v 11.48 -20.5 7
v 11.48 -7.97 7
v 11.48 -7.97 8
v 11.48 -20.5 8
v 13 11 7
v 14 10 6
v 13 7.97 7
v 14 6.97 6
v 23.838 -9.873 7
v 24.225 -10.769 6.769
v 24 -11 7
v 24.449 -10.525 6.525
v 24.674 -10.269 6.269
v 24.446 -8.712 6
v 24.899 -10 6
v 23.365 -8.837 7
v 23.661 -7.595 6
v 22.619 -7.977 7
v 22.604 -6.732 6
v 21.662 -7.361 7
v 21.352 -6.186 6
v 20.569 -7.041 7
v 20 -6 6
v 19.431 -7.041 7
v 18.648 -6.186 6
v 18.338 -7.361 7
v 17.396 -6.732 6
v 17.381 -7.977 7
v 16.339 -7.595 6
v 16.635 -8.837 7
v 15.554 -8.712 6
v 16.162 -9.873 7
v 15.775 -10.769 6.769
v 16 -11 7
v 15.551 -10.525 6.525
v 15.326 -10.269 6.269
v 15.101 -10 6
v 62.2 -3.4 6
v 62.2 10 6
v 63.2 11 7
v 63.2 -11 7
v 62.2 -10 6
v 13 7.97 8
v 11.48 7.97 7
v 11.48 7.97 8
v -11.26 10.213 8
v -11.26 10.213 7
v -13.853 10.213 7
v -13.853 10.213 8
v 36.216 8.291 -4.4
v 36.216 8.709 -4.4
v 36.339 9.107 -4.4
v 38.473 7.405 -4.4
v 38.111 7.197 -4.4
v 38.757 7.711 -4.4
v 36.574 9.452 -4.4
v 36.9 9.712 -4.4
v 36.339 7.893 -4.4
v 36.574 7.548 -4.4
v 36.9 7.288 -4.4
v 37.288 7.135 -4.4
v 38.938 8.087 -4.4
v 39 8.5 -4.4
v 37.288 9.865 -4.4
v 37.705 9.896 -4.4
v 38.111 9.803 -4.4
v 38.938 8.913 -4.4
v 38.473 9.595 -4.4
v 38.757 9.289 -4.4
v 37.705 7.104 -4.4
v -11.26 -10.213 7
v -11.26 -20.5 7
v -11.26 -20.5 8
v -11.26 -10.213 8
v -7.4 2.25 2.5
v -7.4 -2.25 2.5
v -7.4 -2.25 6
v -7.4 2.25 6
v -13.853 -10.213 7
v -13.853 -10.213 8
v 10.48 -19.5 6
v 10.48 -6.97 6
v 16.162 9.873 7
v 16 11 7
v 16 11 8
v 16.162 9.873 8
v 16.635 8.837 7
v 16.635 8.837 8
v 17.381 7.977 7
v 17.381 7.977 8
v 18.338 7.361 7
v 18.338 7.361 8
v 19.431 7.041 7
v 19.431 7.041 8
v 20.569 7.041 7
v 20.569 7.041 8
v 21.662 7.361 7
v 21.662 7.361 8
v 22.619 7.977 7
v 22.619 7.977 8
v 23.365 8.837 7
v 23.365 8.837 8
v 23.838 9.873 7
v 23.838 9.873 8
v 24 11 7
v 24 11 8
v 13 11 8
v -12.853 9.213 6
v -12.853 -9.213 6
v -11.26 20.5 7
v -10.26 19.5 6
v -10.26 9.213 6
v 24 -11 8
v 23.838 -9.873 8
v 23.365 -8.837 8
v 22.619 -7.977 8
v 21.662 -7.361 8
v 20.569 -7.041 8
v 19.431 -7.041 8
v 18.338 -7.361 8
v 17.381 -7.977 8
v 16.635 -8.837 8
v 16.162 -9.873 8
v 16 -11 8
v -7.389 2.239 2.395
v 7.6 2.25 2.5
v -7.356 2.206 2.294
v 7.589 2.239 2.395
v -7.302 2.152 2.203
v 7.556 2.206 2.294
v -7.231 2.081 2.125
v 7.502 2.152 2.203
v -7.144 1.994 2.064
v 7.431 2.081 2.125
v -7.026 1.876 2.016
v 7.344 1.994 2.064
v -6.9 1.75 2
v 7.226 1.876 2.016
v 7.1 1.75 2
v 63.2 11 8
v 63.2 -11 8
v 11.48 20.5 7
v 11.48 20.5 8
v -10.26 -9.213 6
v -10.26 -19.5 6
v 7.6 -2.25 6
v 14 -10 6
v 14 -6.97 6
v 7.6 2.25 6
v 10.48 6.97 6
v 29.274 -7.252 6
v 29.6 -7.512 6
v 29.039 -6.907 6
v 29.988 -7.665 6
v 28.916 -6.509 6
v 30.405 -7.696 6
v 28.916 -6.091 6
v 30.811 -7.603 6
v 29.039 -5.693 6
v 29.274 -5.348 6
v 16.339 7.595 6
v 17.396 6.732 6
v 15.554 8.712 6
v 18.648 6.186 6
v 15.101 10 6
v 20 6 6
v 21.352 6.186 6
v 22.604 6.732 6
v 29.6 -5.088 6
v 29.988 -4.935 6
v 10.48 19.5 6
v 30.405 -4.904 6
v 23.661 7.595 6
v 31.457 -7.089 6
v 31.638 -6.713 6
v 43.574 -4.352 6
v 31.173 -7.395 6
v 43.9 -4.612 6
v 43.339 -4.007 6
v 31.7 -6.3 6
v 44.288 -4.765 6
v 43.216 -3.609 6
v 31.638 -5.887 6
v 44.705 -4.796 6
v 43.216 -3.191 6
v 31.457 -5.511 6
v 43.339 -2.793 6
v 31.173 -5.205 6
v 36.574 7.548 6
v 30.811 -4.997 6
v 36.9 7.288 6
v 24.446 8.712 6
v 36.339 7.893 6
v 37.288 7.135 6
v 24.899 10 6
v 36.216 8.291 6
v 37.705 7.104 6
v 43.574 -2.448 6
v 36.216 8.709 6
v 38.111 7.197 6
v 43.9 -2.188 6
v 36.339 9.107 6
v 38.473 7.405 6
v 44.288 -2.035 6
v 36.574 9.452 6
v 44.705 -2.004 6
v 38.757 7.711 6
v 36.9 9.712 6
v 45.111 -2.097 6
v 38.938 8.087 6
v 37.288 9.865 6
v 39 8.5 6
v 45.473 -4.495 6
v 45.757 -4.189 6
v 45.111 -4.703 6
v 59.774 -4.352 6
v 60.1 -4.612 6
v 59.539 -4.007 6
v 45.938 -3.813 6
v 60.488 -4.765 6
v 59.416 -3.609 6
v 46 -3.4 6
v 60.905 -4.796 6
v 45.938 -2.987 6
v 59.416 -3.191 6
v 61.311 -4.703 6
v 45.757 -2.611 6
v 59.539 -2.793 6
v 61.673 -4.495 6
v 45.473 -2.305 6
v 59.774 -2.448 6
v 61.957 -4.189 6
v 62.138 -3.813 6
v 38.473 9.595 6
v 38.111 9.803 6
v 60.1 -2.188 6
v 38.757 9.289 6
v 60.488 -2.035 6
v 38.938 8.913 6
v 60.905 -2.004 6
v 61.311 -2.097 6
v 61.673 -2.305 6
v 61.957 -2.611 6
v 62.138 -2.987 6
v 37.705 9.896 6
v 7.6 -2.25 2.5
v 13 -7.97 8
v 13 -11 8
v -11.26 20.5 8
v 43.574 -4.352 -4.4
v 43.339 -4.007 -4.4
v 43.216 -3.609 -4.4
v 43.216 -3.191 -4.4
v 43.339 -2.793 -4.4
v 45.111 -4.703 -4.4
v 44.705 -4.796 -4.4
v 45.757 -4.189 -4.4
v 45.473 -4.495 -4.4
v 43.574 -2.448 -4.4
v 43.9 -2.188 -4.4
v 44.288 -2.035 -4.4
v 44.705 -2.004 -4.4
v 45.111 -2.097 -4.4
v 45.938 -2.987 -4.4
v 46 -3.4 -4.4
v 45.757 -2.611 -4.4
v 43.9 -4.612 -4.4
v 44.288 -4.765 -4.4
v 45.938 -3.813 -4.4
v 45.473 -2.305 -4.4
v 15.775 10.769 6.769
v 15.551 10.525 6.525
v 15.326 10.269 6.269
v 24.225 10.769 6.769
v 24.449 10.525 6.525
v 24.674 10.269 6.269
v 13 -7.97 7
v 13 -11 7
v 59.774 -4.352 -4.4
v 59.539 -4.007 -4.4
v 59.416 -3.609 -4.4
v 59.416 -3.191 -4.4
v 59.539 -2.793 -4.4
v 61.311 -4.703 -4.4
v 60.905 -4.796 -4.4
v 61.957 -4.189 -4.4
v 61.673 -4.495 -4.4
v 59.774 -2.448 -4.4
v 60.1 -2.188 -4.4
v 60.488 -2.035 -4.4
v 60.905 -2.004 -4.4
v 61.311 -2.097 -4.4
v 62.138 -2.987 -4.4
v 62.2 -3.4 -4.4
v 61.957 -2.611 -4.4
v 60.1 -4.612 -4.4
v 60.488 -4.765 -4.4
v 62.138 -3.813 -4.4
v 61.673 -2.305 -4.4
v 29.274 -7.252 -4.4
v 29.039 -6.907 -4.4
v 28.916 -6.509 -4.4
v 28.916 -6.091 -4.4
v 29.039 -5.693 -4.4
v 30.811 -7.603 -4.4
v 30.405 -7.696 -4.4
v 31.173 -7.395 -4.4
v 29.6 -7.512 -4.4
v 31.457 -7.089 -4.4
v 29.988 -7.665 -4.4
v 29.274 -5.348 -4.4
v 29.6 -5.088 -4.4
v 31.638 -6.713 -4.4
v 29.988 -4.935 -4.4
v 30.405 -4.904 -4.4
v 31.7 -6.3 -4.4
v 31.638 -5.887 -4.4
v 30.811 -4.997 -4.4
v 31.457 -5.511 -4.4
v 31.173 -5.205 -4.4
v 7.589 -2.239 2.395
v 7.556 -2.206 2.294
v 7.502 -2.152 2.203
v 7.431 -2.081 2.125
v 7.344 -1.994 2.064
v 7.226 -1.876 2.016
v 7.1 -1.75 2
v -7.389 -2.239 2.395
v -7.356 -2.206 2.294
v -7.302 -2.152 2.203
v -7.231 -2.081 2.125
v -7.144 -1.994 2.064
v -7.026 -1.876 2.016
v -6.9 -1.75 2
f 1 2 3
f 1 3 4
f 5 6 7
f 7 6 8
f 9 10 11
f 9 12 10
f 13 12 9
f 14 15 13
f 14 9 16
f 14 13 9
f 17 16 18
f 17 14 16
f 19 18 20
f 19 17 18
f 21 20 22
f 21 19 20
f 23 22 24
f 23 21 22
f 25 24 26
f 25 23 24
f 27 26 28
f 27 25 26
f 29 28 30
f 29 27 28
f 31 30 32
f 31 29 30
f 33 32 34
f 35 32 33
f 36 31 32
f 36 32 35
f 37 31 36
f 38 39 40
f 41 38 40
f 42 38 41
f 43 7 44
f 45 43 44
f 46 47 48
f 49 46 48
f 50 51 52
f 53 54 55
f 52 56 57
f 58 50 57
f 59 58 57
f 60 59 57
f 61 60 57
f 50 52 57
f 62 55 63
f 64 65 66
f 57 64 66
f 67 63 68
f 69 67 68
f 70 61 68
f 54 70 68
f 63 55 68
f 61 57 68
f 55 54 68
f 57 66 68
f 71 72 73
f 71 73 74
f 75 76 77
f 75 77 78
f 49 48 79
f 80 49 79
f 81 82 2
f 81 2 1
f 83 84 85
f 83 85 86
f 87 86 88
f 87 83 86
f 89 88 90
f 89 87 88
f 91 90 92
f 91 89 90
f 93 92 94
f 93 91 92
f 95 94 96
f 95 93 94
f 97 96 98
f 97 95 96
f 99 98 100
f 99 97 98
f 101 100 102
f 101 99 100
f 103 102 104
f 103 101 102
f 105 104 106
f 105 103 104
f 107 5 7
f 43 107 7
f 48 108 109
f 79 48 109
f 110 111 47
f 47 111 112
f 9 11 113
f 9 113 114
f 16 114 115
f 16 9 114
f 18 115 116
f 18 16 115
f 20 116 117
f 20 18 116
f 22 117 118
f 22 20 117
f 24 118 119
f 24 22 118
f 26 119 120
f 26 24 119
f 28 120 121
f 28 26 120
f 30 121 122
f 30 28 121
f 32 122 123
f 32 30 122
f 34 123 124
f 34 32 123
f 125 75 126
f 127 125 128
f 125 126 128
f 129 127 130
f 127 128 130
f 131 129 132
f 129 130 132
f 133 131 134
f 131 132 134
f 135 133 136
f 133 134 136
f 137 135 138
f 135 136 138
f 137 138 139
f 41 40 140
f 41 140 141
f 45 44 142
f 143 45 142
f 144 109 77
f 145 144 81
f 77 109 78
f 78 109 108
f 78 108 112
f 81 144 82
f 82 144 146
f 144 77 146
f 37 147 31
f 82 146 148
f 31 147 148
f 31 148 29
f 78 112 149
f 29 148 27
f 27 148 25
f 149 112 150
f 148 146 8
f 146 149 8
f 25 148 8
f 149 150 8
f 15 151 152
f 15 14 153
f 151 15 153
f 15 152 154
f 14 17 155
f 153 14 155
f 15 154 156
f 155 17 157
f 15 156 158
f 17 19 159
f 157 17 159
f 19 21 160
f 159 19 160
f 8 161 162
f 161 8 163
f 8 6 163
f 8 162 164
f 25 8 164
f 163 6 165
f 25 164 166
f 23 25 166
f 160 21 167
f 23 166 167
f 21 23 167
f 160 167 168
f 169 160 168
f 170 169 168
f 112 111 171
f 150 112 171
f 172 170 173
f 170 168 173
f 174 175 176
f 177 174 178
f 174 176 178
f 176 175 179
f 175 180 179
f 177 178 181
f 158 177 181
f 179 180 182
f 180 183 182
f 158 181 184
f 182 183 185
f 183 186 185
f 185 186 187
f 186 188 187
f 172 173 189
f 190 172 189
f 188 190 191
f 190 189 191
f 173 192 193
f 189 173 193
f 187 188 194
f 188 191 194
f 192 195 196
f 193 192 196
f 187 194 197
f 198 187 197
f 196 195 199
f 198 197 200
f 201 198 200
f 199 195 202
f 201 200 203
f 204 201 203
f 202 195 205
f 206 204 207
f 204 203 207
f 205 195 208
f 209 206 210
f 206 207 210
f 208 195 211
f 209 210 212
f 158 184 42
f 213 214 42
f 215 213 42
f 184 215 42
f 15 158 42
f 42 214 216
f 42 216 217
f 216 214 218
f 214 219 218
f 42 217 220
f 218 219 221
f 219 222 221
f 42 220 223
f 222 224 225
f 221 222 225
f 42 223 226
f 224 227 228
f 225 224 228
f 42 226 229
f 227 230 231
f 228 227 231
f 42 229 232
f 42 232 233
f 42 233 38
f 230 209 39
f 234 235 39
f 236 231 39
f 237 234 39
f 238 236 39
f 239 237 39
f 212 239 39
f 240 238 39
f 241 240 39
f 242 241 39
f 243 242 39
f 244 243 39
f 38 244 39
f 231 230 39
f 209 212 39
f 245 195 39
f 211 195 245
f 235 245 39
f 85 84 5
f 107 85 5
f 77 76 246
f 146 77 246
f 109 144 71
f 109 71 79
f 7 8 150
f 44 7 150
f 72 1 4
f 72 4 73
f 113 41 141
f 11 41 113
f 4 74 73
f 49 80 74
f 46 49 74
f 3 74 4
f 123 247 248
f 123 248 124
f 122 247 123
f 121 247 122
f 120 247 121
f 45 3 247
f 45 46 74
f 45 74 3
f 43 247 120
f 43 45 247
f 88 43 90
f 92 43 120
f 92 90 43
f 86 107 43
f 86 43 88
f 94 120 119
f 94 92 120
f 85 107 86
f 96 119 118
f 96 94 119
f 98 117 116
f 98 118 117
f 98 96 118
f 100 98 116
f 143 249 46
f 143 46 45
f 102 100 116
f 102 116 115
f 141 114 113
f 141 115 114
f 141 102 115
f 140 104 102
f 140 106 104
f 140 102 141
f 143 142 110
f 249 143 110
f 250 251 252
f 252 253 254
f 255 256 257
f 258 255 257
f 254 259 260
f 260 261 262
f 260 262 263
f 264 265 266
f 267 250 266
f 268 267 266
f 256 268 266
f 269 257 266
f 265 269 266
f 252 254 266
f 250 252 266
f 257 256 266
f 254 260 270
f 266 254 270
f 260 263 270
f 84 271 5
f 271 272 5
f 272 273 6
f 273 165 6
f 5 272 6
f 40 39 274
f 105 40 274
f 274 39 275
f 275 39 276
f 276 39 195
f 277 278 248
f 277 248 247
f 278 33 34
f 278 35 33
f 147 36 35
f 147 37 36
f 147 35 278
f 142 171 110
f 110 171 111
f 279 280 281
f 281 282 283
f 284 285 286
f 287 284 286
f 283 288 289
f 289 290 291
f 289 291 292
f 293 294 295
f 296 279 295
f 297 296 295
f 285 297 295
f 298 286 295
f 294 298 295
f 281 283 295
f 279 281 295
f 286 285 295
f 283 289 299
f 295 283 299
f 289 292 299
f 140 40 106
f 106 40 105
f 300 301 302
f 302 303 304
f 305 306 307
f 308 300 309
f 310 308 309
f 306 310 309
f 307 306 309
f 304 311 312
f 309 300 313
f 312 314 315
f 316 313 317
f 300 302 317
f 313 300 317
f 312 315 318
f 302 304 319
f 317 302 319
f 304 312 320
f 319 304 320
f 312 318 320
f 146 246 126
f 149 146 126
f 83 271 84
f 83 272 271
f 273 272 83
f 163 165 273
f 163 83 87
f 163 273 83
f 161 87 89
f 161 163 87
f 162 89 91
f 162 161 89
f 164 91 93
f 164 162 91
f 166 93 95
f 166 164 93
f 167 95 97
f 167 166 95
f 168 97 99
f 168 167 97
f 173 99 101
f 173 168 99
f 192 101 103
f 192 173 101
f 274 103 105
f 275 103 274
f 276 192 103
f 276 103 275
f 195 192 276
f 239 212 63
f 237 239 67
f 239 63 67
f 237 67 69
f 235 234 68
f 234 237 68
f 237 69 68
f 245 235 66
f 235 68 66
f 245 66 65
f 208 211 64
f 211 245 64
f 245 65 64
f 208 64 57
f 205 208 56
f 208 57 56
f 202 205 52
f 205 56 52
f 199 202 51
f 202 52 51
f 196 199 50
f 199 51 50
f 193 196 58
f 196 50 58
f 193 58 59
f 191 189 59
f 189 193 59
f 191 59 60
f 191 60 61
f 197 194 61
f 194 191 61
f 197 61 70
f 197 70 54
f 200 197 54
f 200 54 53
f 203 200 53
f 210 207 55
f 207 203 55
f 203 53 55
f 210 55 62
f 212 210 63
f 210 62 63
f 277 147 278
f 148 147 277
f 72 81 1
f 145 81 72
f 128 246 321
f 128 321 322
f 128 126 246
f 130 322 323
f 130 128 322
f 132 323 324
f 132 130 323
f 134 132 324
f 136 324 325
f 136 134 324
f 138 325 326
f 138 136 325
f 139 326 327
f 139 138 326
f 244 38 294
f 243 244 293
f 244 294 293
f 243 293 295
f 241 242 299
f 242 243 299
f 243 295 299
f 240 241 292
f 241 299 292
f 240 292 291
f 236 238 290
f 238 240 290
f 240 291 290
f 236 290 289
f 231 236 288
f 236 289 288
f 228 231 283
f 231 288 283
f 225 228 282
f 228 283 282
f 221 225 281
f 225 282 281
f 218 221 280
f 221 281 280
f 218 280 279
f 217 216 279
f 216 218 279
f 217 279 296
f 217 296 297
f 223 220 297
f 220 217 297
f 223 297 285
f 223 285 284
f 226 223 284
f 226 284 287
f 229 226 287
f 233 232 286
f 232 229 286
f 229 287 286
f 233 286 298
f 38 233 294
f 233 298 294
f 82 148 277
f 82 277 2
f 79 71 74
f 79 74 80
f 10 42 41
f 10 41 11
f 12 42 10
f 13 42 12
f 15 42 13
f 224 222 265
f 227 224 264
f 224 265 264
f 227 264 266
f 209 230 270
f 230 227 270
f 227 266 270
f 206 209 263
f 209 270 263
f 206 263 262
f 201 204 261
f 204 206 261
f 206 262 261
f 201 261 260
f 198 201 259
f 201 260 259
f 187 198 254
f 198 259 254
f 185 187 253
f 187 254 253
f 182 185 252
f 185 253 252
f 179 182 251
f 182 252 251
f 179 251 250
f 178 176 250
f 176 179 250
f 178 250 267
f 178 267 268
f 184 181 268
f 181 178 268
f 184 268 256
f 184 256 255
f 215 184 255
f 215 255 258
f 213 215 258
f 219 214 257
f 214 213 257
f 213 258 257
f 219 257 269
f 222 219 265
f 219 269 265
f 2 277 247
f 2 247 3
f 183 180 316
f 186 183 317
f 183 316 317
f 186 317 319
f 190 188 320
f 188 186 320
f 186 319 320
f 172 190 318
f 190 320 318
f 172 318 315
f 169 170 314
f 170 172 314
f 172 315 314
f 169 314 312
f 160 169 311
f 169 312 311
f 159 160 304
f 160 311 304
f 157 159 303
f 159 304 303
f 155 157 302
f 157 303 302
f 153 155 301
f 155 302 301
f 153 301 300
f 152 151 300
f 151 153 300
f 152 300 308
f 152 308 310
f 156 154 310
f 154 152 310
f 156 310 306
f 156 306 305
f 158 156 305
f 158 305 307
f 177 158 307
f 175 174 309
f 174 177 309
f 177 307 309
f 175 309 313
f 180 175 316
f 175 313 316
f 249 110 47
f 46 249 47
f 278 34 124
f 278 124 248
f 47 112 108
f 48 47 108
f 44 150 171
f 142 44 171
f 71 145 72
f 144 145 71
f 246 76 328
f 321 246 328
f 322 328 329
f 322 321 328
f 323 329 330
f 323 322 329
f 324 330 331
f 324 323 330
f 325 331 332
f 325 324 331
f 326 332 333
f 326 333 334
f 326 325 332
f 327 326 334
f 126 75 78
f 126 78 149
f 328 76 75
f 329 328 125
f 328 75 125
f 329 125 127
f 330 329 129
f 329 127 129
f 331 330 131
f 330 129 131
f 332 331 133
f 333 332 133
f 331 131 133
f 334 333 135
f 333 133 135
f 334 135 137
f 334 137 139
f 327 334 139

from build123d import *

# Parameters (mm, degrees)
CYLINDER044_R     = 1.4
CYLINDER044_DEPTH = 11
CYLINDER046_R     = 1.4
CYLINDER046_DEPTH = 11
CYLINDER047_R     = 1.4
CYLINDER047_DEPTH = 11
BOX059_W          = 15
BOX059_H          = 4.5
BOX059_DEPTH      = 4
FILLET009_R       = 0.5
PAD025_DEPTH      = 2
CHAMFER007_SIZE   = 1
CYLINDER045_R     = 1.4
CYLINDER045_DEPTH = 11


with BuildPart() as cylinder044:
    # Cylinder044 → Cylinder044 (new body)
    with BuildSketch(Plane(origin=(44.6, -3.4, -4.4), x_dir=(1, 0, 0), z_dir=(0, 0, 1))):
        Circle(CYLINDER044_R)
    extrude(amount=CYLINDER044_DEPTH)


with BuildPart() as cylinder046:
    # Cylinder046 → Cylinder046 (new body)
    with BuildSketch(Plane(origin=(30.3, -6.3, -4.4), x_dir=(1, 0, 0), z_dir=(0, 0, 1))):
        Circle(CYLINDER046_R)
    extrude(amount=CYLINDER046_DEPTH)


with BuildPart() as cylinder047:
    # Cylinder047 → Cylinder047 (new body)
    with BuildSketch(Plane(origin=(37.6, 8.5, -4.4), x_dir=(1, 0, 0), z_dir=(0, 0, 1))):
        Circle(CYLINDER047_R)
    extrude(amount=CYLINDER047_DEPTH)


with BuildPart() as fillet009:
    # Box059 → Box059 (new body)
    with BuildSketch(Plane(origin=(-7.4, -2.25, 2), x_dir=(1, 0, 0), z_dir=(0, 0, 1))):
        with Locations((7.5, 2.25)):
            Rectangle(BOX059_W, BOX059_H)
    extrude(amount=BOX059_DEPTH)

    # Fillet009
    fillet009_edges = [fillet009.edges().sort_by_distance(p)[0] for p in [
        (-7.4, 0, 2),
        (7.6, 0, 2),
        (0.1, -2.25, 2),
        (0.1, 2.25, 2),
    ]]
    fillet(fillet009_edges, radius=FILLET009_R)


with BuildPart() as chamfer007:
    # Sketch030 → Pad025 (new body)
    with BuildSketch(Plane.XY):
        with BuildLine():
            Line((-11.26, 20.5), (-11.26, 10.212751))
            Line((-11.26, 10.212751), (-13.853027, 10.212751))
            Line((-13.853027, 10.212751), (-13.853027, -10.212751))
            Line((-11.26, -10.212751), (-13.853027, -10.212751))
            Line((-11.26, -20.5), (-11.26, -10.212751))
            Line((11.48, -20.5), (-11.26, -20.5))
            Line((11.48, -7.97), (11.48, -20.5))
            Line((13, -7.97), (11.48, -7.97))
            Line((13, -11), (13, -7.97))
            Line((16, -11), (13, -11))
            ThreePointArc((24, -11), (20, -7), (16, -11))
            Line((63.2, -11), (24, -11))
            Line((63.2, 11), (63.2, -11))
            Line((63.2, 11), (24, 11))
            ThreePointArc((16, 11), (20, 7), (24, 11))
            Line((16, 11), (13, 11))
            Line((13, 11), (13, 7.97))
            Line((13, 7.97), (11.48, 7.97))
            Line((11.48, 7.97), (11.48, 20.5))
            Line((11.48, 20.5), (-11.26, 20.5))
        make_face()
    extrude(amount=PAD025_DEPTH)

    # Chamfer007
    chamfer007_edges = [chamfer007.edges().sort_by_distance(p)[0] for p in [
        (14.5, 11, 0),
        (13, 9.485, 0),
        (12.24, 7.97, 0),
        (11.48, 14.235, 0),
        (0.11, 20.5, 0),
        (-11.26, 15.356376, 0),
        (-12.556514, 10.212751, 0),
        (-13.853027, 0, 0),
        (-12.556514, -10.212751, 0),
        (-11.26, -15.356376, 0),
        (0.11, -20.5, 0),
        (11.48, -14.235, 0),
        (12.24, -7.97, 0),
        (13, -9.485, 0),
        (14.5, -11, 0),
        (20, -7, 0),
        (43.6, -11, 0),
        (63.2, 0, 0),
        (43.6, 11, 0),
        (20, 7, 0),
    ]]
    chamfer(chamfer007_edges, length=CHAMFER007_SIZE)


with BuildPart() as chamfer007_1:
    # Chamfer007 placement: moved
    add(chamfer007.part.moved(Location((0, 0, 6))))


with BuildPart() as f_04_pcbcoverbig:
    # Cylinder045 → Cylinder045 (new body)
    with BuildSketch(Plane(origin=(60.8, -3.4, -4.4), x_dir=(1, 0, 0), z_dir=(0, 0, 1))):
        Circle(CYLINDER045_R)
    extrude(amount=CYLINDER045_DEPTH)

    # Fusion047: union Cylinder044, Cylinder046, Cylinder047, Fillet009, Chamfer007
    add(cylinder044.part)
    add(cylinder046.part)
    add(cylinder047.part)
    add(fillet009.part)
    add(chamfer007_1.part)


solid = f_04_pcbcoverbig.part
